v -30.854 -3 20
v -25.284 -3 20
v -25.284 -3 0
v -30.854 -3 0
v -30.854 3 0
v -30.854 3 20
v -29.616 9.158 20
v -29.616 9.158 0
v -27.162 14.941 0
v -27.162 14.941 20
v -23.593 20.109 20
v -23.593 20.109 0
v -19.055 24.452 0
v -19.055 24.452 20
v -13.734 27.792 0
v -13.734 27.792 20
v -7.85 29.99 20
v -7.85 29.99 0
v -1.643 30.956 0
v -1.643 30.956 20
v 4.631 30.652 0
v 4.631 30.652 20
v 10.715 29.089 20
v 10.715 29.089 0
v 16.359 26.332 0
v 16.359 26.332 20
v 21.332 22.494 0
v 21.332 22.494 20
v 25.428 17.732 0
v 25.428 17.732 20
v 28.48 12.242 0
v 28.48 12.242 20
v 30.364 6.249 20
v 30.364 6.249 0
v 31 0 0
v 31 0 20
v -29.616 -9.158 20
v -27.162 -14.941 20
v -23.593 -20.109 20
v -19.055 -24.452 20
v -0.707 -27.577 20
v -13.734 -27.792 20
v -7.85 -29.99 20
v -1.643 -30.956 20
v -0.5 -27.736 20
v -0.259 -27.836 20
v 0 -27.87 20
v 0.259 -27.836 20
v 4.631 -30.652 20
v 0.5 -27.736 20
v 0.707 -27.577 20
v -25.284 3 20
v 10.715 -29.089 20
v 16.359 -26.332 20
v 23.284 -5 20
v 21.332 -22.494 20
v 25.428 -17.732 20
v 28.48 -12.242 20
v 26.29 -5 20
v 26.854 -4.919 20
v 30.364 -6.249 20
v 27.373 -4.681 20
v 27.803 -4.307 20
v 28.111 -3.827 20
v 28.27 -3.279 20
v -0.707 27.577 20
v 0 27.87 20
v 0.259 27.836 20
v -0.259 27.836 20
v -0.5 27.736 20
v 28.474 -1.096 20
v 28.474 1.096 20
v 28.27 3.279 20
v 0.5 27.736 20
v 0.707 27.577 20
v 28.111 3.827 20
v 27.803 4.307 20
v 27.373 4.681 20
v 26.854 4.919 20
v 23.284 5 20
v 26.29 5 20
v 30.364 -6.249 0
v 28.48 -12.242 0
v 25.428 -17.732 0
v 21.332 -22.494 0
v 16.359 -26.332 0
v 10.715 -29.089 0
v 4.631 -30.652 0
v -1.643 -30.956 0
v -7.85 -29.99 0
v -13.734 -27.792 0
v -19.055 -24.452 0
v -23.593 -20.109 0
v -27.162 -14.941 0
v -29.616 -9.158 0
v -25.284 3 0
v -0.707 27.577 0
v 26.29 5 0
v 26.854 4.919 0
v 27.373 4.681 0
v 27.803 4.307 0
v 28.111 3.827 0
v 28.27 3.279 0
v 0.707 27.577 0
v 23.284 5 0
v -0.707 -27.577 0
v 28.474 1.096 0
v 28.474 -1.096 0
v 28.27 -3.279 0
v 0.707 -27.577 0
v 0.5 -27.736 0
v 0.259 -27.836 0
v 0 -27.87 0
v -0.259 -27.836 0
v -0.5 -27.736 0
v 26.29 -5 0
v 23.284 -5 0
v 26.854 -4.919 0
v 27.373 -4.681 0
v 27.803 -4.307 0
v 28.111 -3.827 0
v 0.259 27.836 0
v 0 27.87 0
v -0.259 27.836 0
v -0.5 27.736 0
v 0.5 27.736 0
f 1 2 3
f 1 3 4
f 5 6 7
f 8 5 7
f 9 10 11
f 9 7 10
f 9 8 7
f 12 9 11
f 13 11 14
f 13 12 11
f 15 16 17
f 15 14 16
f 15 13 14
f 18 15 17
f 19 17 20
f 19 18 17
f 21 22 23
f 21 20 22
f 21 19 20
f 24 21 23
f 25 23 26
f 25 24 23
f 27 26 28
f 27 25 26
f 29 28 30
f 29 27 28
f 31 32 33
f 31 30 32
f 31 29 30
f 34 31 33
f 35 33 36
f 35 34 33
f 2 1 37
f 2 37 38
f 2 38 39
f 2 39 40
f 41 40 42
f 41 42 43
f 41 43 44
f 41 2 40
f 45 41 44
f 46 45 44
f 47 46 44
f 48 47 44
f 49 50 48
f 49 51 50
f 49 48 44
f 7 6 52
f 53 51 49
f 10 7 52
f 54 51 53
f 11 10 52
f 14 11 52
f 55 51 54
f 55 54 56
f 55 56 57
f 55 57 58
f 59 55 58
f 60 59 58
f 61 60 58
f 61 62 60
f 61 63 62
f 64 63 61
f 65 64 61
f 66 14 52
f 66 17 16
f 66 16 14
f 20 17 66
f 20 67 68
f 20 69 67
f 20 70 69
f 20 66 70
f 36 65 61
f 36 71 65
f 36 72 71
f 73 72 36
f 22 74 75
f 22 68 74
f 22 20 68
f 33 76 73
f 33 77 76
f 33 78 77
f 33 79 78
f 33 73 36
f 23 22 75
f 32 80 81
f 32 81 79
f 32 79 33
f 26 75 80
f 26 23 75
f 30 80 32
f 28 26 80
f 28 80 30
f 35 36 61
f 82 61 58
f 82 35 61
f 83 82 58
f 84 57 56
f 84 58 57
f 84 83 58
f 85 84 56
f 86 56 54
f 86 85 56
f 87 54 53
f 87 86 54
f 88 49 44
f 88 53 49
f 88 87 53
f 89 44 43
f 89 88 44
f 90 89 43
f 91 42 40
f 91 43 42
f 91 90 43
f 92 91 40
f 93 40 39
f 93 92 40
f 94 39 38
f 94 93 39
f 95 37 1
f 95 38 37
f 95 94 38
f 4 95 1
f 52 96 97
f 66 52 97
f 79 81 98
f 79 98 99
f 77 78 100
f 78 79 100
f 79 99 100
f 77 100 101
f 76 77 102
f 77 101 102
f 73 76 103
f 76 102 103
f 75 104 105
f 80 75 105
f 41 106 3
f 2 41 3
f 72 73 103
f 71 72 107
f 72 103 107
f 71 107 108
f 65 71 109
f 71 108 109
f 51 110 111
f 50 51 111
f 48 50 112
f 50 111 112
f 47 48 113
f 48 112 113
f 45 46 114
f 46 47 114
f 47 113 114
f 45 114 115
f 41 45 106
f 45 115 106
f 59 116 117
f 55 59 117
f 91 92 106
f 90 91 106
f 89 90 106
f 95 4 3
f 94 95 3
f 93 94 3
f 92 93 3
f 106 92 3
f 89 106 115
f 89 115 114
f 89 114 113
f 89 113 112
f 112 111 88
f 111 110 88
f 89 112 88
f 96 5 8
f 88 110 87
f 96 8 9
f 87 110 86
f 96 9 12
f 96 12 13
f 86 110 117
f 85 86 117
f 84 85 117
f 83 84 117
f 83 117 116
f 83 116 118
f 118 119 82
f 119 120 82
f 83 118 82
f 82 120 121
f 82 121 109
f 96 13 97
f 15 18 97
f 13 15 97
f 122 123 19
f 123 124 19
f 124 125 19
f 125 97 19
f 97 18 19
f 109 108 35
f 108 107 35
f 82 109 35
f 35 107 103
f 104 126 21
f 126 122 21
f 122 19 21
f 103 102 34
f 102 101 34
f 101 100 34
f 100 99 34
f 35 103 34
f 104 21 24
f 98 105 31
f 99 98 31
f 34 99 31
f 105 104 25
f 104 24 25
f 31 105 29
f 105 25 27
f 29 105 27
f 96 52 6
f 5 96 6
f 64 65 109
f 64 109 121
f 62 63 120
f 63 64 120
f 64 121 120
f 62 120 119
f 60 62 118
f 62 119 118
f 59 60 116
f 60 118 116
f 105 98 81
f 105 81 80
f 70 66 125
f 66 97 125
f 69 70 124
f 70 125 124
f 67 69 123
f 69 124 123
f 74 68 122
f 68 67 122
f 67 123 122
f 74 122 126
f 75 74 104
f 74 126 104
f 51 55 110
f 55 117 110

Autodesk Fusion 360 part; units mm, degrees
sketch "Sketch1" plane through (0, 0, 0) normal (0, 0, 1) x (1, 0, 0)
  line L0 (0.7071, 27.5772) -> (23.2843, 5)
  line L1 (23.2843, -5) -> (0.7071, -27.5772)
  line L2 (-0.7071, -27.5772) -> (-25.2843, -3)
  line L3 (-25.2843, 3) -> (-0.7071, 27.5772)
  line L4 (0, 0) -> (57.5603, 0) construction
  line L5 (31, 0) -> (31, -17.1775)
  line L6 (-25.2843, 3) -> (-30.8545, 3)
  line L7 (-25.2843, -3) -> (-30.8545, -3)
  arc A0 (0.7071, 27.5772) -> (-0.7071, 27.5772) centre (0, 26.8701) ccw
  arc A1 (-0.7071, -27.5772) -> (0.7071, -27.5772) centre (0, -26.8701) ccw
  arc A2 (-30.8545, -3) -> (-30.8545, 3) centre (0, 0) ccw
  line L8 (26.2897, 5) -> (23.2843, 5)
  line L9 (26.2897, -5) -> (23.2843, -5)
  arc A3 (28.2701, -3.2791) -> (28.2701, 3.2791) centre (5, 0) ccw
  arc A4 (28.2701, 3.2791) -> (26.2897, 5) centre (26.2897, 3) ccw
  arc A5 (26.2897, -5) -> (28.2701, -3.2791) centre (26.2897, -3) ccw
  point P0 (0, 28.2843)
  point P1 (28.2843, 0)
  point P2 (29, 5)
  dimension "d1" = 62
  dimension "d2" = 40
  dimension "d4" = 20
  dimension "d5" = 20
  dimension "d7" = 45
  dimension "d9" = 3
  dimension "d11" = 1
  dimension "d13" = 5
  dimension "d14" = 5
  dimension "d15" = 47
  dimension "d16" = 2
extrude "Extrude1" add sketch "Sketch1" along normal blind 20
